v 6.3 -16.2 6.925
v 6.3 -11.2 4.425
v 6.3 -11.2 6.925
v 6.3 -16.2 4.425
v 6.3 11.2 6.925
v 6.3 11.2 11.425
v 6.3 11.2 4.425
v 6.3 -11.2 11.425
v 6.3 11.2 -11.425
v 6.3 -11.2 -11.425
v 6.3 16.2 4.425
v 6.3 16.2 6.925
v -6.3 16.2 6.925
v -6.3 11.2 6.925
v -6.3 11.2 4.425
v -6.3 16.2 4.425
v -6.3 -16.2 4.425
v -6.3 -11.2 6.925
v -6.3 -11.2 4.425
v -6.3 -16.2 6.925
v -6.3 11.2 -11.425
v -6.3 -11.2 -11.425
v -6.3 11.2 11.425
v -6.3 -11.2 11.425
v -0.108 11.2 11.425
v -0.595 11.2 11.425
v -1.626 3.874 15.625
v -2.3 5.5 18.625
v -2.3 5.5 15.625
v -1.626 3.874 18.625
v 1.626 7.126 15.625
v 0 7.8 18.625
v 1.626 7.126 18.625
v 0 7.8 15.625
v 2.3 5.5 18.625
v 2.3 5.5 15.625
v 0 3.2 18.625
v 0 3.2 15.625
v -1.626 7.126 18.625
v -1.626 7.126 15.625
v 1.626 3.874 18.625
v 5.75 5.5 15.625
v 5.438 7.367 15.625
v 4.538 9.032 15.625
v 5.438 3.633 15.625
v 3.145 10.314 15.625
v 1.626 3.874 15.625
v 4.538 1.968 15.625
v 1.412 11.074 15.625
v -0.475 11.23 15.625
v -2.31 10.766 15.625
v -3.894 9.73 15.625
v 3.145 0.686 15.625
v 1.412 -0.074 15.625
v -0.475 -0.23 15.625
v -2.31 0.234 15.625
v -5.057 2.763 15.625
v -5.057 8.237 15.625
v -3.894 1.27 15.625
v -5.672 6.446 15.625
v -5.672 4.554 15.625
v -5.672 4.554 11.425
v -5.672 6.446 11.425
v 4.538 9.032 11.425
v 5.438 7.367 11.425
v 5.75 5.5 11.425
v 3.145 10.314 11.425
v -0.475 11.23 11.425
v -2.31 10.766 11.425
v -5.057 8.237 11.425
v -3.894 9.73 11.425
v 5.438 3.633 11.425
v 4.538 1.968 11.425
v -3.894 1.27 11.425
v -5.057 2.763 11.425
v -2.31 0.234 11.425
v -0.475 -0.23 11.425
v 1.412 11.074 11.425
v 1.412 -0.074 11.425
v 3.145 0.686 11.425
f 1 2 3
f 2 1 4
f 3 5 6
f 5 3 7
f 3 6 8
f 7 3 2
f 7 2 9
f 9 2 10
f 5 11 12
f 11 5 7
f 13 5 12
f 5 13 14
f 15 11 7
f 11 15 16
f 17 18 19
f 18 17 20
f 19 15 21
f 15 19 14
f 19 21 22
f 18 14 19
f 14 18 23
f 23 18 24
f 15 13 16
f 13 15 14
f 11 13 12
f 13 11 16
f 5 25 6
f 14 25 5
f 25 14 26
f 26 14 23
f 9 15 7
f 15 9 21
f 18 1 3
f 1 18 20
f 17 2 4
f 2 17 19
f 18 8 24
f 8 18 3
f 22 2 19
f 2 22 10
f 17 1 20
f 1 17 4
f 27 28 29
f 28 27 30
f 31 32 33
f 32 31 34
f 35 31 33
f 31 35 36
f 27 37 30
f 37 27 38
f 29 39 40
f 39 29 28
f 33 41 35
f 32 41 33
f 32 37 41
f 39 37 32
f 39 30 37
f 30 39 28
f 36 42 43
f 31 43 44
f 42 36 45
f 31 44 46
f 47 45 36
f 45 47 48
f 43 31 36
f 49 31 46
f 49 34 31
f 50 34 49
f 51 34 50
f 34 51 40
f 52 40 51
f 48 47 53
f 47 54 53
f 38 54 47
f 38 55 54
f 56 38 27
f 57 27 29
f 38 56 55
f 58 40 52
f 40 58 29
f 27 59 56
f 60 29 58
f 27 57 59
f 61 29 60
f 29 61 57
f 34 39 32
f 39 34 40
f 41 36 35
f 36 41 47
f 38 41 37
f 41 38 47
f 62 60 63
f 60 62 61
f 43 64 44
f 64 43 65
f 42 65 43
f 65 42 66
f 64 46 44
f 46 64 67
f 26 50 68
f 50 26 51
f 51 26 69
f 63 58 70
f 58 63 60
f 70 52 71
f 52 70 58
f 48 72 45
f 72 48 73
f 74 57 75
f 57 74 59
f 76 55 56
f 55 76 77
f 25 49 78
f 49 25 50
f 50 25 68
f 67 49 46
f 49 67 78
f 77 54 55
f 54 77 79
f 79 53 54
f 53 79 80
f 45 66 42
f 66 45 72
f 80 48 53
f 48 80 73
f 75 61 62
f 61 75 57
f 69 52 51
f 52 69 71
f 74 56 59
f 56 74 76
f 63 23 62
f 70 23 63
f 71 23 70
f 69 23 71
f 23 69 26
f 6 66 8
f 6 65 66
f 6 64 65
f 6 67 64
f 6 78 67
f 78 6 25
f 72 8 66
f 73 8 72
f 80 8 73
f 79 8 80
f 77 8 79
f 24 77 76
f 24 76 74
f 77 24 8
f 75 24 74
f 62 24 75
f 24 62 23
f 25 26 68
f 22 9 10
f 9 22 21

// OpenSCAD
// file: const.scad
r_out_608 = 22/2;
r_in_608 = 8/2;
h_608 = 7;

LM8UU_d_in = 8;
LM8UU_d_out = 15;
LM8UU_h = 24;

endStopLength = 12.86;
endStopWidth = 5.80;
endStopHeight = 6.21;
endStopHeightTotal = 10.00;
endStopHoleRadius = 1.92/2;

m2_head_d = 3.18;
m2_head_h = 1.42;
m2_body_d = 1.92;

m2_20_h = 21.39;
m2_20_body_h = m2_20_h - m2_head_h;

m4_head_d = 7.3;
m4_head_h = 2.2;
m4_body_d = 3.89;

m4_10_h = 14;
m4_10_body_h = m4_10_h - m4_head_h;

servo_9g_arm1_r1 = 2;
servo_9g_arm1_r2 = 7.22/2;
servo_9g_arm1_length_of_circle = 16;
servo_9g_arm1_small_h = 1.73;
servo_9g_arm1_h = 4.6;
servo_9g_arm1_hole_t = 1.29;


servo_9g_w = 12.6;
servo_9g_h = 22.85;
servo_9g_l = 22.4;
servo_9g_wings_w = servo_9g_w;
servo_9g_wings_h = 2.5;
servo_9g_wings_l = (32.40 - servo_9g_l) / 2;
servo_9g_wings_top_margin = 4.5;
servo_9g_axis_plane_d = 11.5;
servo_9g_axis_plane_h = 27.05 - servo_9g_h;
servo_9g_axis_d = 4.6;
servo_9g_axis_h = 3;
servo_9g_axis_right_margin = 8 - servo_9g_axis_d/2;

servo_sg5010_w = 20;
servo_sg5010_h = 39.27;
servo_sg5010_l = 40;
servo_sg5010_wings_w = servo_sg5010_w;
servo_sg5010_wings_h = 2.7;
servo_sg5010_wings_l = 7;
servo_sg5010_wings_top_margin = 9;
servo_sg5010_axis_plane_d = 13.52;
servo_sg5010_axis_plane_h = 1.88;
servo_sg5010_axis_d = 5.81;
servo_sg5010_axis_h = 4.27;
servo_sg5010_axis_right_margin = 12.69 - servo_sg5010_axis_d/2;
// main file
include <const.scad>

module LM8UU() {
    difference() {
        cylinder(r = LM8UU_d_out/2, h = LM8UU_h, $fn = 100);
        translate([0,0,-1]) cylinder(r = LM8UU_d_in/2, h = LM8UU_h + 2, $fn = 100);
    }
}

module belling608() {
    pipe(r_out = r_out_608, t = (r_out_608 - r_in_608), h = h_608);
}

module endStop() {
    //板
    difference() {
        translate([0,0,5]) 
            rotate([-15,0,0])
                cube([4.16, 12, 0.5], center = true);
        translate([0,0,1])
            cube([1.5,20,10],center = true);
    }
    //主体
    difference() {
        cube([endStopWidth, endStopLength, endStopHeight], center = true);
        //孔
        translate([0,6.10/2,-2.1]) 
            rotate([0,90,0]) 
                cylinder(r = endStopHoleRadius, h = 10, center = true, $fn = 30);
        //孔
        translate([0,-6.10/2,-2.1]) 
            rotate([0,90,0]) 
                cylinder(r = endStopHoleRadius, h = 10, center = true, $fn = 30);
 
    }
    //脚
    translate([0,0,-4]) 
        cube([0.5,0.2,3], center = true);
    translate([0,5.5,-4]) 
        cube([0.5,0.2,3], center = true);
    translate([0,-5.5,-4]) 
        cube([0.5,0.2,3], center = true);
}

module screwsM2_20() {
    screws(m2_head_d/2, m2_head_h, m2_body_d/2, m2_20_body_h);
}

module screwsM4_10() {
    screws(m4_head_d/2, m4_head_h, m4_body_d/2, m4_10_body_h);    
}

module screws(headR, headH, bodyR, bodyH) {
    translate([0,0,(headH + bodyH)/2]) 
        cylinder(r = headR, h = headH, center = true, $fn = 30);
    cylinder(r = bodyR, h =  bodyH, center = true, $fn = 30);
}

module servoArm1() {
difference() {
    union() {
        h_tmp = servo_9g_arm1_small_h;
        //big circle
        cylinder(r = servo_9g_arm1_r2, h = h_tmp, $fn = 100, center = false);
        //small circle
        translate([0,servo_9g_arm1_length_of_circle,0]) {
            cylinder(r = servo_9g_arm1_r1, h = h_tmp, $fn = 100, center = false);
        }
        //polygon
        linear_extrude(height = h_tmp, center = false) {
            polygon(points=[
                            [0,0],
                            [servo_9g_arm1_r2,0],
                            [servo_9g_arm1_r1,servo_9g_arm1_length_of_circle],
                            [0,servo_9g_arm1_length_of_circle]
                            ], paths=[[0,1,2,3]]);
        }
        mirror() {
        linear_extrude(height = h_tmp, center = false) {
            polygon(points=[
                            [0,0],
                            [servo_9g_arm1_r2,0],
                            [servo_9g_arm1_r1,servo_9g_arm1_length_of_circle],
                            [0,servo_9g_arm1_length_of_circle]
                            ], paths=[[0,1,2,3]]);
            }
        }
        //pipe
        translate([0,0,0]) {
            cylinder(r=servo_9g_arm1_r2, h=servo_9g_arm1_h, $fn=100);
        }
    }
    translate([0,0,-1]) {
        cylinder(r=(servo_9g_arm1_r2-servo_9g_arm1_hole_t), h=(servo_9g_arm1_h+2), $fn=100);
    }
}
}

module pipe(r_out, t, h, center = true) {
    difference() {
        cylinder(r = r_out, h = h, center = center, $fn = 100);
        translate([0,0,-1]) {
            cylinder(r = (r_out - t), h = (h + 4), center = center, $fn = 100);
        }
    }
}

module test() {
//    LM8UU();
//    endStop();
//    screwsM2_20();
//    servoArm1();
//    rect(w=10,h=10,r=2);
//    %square([10,10],center=true);
    servo_9g();
//    servo9gRotator1();
//    servoSG5010();
}

module rect(w,h,r=0) {
    d = r*2;
    width=w-d;
    height=h-d;
    if (0!=r) {
        square([width,height],center=true);
        translate([-width/2,-height/2,0]) {circle(r=r,$fn=100,center=true);}
        translate([width/2,-height/2,0]) {circle(r=r,$fn=100,center=true);}
        translate([-width/2,height/2,0]) {circle(r=r,$fn=100,center=true);}
        translate([width/2,height/2,0]) {circle(r=r,$fn=100,center=true);}

        translate([0,(height+r)/2,0]) {square([width,r],center=true);}
        translate([0,-(height+r)/2,0]) {square([width,r],center=true);}
        translate([(width+r)/2,0,0]) {square([r,height],center=true);}
        translate([-(width+r)/2,0,0]) {square([r,height],center=true);}
    } else {
        square([width,height],center=true);
    }
}

module servo_9g() {
       servoBase(
        [0,0,1],
        servo_9g_w,
        servo_9g_h,
        servo_9g_l,
        servo_9g_wings_w,
        servo_9g_wings_h,
        servo_9g_wings_l,
        servo_9g_wings_top_margin,
        servo_9g_axis_d,
        servo_9g_axis_h,
        servo_9g_axis_right_margin,
        servo_9g_axis_plane_d,
        servo_9g_axis_plane_h
    ); 
}

module servo_sg5010() {
    servoBase(
        [0.2,0.2,0.2],
        servo_sg5010_w,
        servo_sg5010_h,
        servo_sg5010_l,
        servo_sg5010_wings_w,
        servo_sg5010_wings_h,
        servo_sg5010_wings_l,
        servo_sg5010_wings_top_margin,
        servo_sg5010_axis_d,
        servo_sg5010_axis_h,
        servo_sg5010_axis_right_margin,
        servo_sg5010_axis_plane_d,
        servo_sg5010_axis_plane_h
    );
}

module servoBase(
        a_color,
        a_servo_w,
        a_servo_h,
        a_servo_l,
        a_servo_wings_w,
        a_servo_wings_h,
        a_servo_wings_l,
        a_servo_wings_top_margin,
        a_servo_axis_d,
        a_servo_axis_h,
        a_servo_axis_right_margin,
        a_servo_axis_plane_d,
        a_servo_axis_plane_h) {

    //axis
    color([1,1,1]) {
        translate([
                    0,
                    a_servo_l/2-a_servo_axis_right_margin,
                    (a_servo_h+a_servo_axis_h)/2+a_servo_axis_plane_h
                    ]) {
            cylinder(center=true,d=a_servo_axis_d,h=a_servo_axis_h);
        }
    }
    //axis panel
    color (a_color) {
        translate([
                    0,
                    a_servo_l/2-a_servo_axis_right_margin,
                    (a_servo_h+a_servo_axis_plane_h)/2
                ]) {
            cylinder(center=true,d=a_servo_axis_plane_d,h=a_servo_axis_plane_h);
        }
    }
    //body
    color (a_color) {
        cube(center=true,[a_servo_w,a_servo_l,a_servo_h]);
    }
    //wings
    color (a_color) {
        translate([
                    0,
                    (a_servo_l+a_servo_wings_l)/2,
                    (a_servo_h-a_servo_wings_h)/2-a_servo_wings_top_margin
                    ]) {
            cube(center=true,[a_servo_wings_w, a_servo_wings_l, a_servo_wings_h]);
        }
        translate([
                    0,
                    -(a_servo_l+a_servo_wings_l)/2,
                    (a_servo_h-a_servo_wings_h)/2-a_servo_wings_top_margin
                    ]) {
            cube(center=true,[a_servo_wings_w, a_servo_wings_l, a_servo_wings_h]);
        }
    }
}

module servo9gRotator1(aFn=16) {
//    color([0,1,0],0.3){
        thin = 2;
        difference() {
            union() {
                //bottom panel
                translate([0,0,-(servo_9g_body_h+thin)/2])
                    cube([servo_9g_body_w, 2*thin+servo_9g_body_l, thin], center=true);

                translate([(servo_9g_body_w+thin)/2,-thin,-(servo_9g_body_h)/2])
                    cube([thin, thin, thin*2], center=true);
                translate([(servo_9g_body_w+thin)/2,-thin*3,-(servo_9g_body_h)/2])
                    cube([thin, thin, thin*2], center=true);
                translate([(servo_9g_body_w+thin)/2,-thin*5,-(servo_9g_body_h)/2])
                    cube([thin, thin, thin*2], center=true);

                translate([-(servo_9g_body_w+thin)/2,-thin,-(servo_9g_body_h)/2])
                    cube([thin, thin, thin*2], center=true);
                translate([-(servo_9g_body_w+thin)/2,-thin*3,-(servo_9g_body_h)/2])
                    cube([thin, thin, thin*2], center=true);
                translate([-(servo_9g_body_w+thin)/2,-thin*5,-(servo_9g_body_h)/2])
                    cube([thin, thin, thin*2], center=true);

                //left panel
                translate([0,-(servo_9g_body_l+thin)/2,0])
                    cube([servo_9g_body_w,thin,servo_9g_body_h],center=true);
                //right panel
                translate([0,(servo_9g_body_l+thin)/2,0])
                    cube([servo_9g_body_w,thin,servo_9g_body_h],center=true);
         
//                gear_h = 5;
//                //gear
//                translate([0,(servo_9g_body_l+gear_h)/2,(servo_9g_body_h-servo_9g_body_w)/2])
//                    rotate([90,0,0])
//                        cylinder(d=8,h=gear_h,center=true,$fn=aFn);
            }
            //belling cylinder
            translate([0,0,(servo_9g_body_h-servo_9g_body_w)/2])
                rotate([90,0,0])
                    cylinder(d=6,h=60,center=true,$fn=aFn);
        }
//    }
}


test();
